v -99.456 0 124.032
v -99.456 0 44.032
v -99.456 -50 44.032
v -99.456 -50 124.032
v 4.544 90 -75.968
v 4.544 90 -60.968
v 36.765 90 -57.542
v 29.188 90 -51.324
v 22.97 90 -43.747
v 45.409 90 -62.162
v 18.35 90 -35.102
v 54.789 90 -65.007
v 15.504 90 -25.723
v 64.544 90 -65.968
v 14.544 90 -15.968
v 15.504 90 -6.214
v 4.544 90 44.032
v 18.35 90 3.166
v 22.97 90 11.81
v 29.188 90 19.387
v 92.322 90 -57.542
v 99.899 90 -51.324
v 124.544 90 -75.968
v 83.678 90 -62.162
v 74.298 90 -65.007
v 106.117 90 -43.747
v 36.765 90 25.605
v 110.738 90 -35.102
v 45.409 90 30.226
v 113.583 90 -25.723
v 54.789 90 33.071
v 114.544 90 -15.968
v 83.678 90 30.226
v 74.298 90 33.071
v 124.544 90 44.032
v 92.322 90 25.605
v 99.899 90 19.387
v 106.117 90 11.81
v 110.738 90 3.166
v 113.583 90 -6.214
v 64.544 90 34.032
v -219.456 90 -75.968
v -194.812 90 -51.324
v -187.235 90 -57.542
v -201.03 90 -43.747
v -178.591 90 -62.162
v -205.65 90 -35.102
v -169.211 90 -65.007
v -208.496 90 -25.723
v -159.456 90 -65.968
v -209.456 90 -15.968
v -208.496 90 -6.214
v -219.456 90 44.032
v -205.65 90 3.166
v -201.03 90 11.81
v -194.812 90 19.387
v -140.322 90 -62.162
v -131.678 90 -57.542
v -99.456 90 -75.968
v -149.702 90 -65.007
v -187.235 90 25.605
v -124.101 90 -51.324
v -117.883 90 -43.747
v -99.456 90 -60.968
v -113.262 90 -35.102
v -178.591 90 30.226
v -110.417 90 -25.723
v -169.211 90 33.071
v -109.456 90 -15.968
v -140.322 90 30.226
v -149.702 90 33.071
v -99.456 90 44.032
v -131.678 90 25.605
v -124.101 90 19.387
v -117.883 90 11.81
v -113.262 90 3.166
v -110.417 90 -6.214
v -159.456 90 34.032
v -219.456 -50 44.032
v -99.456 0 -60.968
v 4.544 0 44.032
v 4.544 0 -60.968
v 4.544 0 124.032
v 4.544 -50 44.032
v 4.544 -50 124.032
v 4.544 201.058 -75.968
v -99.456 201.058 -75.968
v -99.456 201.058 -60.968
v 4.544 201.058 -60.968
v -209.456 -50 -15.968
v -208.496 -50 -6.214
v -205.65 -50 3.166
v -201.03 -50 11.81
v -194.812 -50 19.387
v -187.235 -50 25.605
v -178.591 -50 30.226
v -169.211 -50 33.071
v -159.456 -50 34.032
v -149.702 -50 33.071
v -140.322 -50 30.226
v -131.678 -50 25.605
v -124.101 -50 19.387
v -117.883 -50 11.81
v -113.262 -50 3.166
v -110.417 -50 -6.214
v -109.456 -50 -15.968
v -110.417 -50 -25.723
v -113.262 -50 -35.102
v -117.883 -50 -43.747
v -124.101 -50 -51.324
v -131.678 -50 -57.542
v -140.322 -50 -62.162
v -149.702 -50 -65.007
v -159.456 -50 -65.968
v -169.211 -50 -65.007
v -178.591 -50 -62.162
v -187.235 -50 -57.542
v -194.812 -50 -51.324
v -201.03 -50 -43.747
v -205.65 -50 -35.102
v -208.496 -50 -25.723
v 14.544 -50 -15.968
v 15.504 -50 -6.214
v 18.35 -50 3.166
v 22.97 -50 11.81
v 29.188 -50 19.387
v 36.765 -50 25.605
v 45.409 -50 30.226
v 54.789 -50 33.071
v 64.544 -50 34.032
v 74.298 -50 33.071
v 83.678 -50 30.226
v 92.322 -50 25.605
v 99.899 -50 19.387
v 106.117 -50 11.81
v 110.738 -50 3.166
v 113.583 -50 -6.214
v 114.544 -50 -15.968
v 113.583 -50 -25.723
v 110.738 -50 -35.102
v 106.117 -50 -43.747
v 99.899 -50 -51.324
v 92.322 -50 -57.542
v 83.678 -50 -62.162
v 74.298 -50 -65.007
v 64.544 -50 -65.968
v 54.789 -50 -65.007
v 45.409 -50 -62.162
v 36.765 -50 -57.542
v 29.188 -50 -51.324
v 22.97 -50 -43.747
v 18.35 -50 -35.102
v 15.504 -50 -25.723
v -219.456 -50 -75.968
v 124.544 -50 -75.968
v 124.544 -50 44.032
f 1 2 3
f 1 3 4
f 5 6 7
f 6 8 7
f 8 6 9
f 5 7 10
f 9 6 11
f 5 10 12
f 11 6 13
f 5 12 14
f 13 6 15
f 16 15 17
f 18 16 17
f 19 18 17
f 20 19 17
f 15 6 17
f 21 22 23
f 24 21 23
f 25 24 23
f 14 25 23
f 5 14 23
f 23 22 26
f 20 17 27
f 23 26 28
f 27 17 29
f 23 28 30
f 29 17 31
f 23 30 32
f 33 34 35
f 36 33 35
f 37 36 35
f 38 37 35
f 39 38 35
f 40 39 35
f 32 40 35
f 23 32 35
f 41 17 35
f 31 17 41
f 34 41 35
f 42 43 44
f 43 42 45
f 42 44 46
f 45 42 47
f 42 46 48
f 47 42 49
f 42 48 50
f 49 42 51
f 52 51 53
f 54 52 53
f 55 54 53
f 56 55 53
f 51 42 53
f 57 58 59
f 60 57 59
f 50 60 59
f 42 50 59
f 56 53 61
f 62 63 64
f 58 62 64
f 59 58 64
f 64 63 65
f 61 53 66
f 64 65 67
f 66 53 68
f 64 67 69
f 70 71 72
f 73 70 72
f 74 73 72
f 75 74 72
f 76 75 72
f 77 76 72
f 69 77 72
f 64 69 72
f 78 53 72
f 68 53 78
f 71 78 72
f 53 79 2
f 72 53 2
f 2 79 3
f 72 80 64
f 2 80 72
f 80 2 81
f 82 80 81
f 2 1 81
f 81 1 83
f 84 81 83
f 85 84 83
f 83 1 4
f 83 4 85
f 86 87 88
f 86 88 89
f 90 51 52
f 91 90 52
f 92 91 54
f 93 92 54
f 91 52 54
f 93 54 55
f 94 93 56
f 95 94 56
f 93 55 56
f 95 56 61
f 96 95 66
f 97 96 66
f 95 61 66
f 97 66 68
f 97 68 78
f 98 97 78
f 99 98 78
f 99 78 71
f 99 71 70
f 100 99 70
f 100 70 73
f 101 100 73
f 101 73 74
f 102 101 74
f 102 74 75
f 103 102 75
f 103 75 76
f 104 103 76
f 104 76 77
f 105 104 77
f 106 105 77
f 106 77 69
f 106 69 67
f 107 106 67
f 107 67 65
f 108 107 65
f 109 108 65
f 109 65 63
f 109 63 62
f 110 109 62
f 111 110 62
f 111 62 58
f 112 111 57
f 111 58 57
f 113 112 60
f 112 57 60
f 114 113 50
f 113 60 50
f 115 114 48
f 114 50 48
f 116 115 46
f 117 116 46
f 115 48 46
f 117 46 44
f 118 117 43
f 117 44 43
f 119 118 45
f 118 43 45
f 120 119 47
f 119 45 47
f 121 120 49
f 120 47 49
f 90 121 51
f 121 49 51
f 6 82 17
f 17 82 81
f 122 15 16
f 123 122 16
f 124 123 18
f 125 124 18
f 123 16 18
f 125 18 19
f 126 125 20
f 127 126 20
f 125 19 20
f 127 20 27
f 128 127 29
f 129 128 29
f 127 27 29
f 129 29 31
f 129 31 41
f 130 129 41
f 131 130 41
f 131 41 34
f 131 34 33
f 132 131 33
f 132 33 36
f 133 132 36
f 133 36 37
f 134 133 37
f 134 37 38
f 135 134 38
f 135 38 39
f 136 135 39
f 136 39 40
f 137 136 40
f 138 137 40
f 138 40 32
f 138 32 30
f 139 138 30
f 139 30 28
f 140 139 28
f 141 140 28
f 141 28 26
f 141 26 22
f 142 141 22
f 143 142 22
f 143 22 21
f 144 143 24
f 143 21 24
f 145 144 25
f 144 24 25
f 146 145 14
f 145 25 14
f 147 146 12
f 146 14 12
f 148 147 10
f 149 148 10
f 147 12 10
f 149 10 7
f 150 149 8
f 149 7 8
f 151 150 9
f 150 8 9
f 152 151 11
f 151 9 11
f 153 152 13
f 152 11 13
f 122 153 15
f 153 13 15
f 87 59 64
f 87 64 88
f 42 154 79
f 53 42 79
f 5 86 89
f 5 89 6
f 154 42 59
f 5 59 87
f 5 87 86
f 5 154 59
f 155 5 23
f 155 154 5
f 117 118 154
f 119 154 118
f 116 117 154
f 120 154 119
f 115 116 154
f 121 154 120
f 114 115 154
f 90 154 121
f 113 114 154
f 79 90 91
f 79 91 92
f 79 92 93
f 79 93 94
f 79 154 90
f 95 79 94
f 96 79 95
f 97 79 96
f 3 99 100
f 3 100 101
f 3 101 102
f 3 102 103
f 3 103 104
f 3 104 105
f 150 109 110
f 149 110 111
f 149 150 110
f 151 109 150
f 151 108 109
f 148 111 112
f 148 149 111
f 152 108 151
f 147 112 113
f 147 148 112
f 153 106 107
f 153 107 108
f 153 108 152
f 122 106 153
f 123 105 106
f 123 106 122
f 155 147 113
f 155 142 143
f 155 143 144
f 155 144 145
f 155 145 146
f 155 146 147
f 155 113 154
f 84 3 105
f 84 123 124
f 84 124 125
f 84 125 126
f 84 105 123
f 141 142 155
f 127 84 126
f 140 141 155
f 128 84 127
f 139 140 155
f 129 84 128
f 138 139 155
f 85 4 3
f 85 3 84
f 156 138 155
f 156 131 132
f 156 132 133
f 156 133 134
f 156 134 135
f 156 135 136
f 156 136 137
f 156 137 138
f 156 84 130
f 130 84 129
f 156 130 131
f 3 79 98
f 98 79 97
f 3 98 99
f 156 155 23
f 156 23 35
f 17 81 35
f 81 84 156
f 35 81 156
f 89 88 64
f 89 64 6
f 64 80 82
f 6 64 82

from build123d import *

# Parameters (mm, degrees)
F0_W     = 104
F0_H     = 200
F1_DEPTH = 50
F2_W     = 120
F2_H     = 120
F3_DEPTH = 140
F4_R     = 50
F5_DEPTH = 140.001
F7_DEPTH = 15


with BuildPart() as f1:
    # F0 (on Front) → F1 (new body)
    with BuildSketch(Plane.XZ):
        with Locations((-47.456343, 24.031783)):
            Rectangle(F0_W, F0_H)
    extrude(amount=F1_DEPTH)

    # F2 (on face) → F3 (join)
    with BuildSketch(Plane.XZ.offset(50)):
        with Locations((-159.456343, -15.968217)):
            Rectangle(F2_W, F2_H)
        with Locations((64.543657, -15.968217)):
            Rectangle(F2_W, F2_H)
    extrude(amount=-F3_DEPTH)

    # F4 (on face) → F5 (cut, through all)
    with BuildSketch(Plane(origin=(0, 90, 0), x_dir=(-1, 0, 0), z_dir=(0, 1, 0))):
        with Locations((-64.543657, -15.968217)):
            Circle(F4_R)
        with Locations((159.456343, -15.968217)):
            Circle(F4_R)
    extrude(amount=-F5_DEPTH, mode=Mode.SUBTRACT)

    # F6 (on face) → F7 (join)
    with BuildSketch(Plane(origin=(0, 0, -75.968217), x_dir=(1, 0, 0), z_dir=(0, 0, -1))):
        Polygon((0, 0), (-99.456343, 0), (-99.456343, -90), (-99.456343, -201.058388), (4.543657, -201.058388), (4.543657, -90), (4.543657, 0), align=None)
    extrude(amount=-F7_DEPTH)


solid = f1.part
